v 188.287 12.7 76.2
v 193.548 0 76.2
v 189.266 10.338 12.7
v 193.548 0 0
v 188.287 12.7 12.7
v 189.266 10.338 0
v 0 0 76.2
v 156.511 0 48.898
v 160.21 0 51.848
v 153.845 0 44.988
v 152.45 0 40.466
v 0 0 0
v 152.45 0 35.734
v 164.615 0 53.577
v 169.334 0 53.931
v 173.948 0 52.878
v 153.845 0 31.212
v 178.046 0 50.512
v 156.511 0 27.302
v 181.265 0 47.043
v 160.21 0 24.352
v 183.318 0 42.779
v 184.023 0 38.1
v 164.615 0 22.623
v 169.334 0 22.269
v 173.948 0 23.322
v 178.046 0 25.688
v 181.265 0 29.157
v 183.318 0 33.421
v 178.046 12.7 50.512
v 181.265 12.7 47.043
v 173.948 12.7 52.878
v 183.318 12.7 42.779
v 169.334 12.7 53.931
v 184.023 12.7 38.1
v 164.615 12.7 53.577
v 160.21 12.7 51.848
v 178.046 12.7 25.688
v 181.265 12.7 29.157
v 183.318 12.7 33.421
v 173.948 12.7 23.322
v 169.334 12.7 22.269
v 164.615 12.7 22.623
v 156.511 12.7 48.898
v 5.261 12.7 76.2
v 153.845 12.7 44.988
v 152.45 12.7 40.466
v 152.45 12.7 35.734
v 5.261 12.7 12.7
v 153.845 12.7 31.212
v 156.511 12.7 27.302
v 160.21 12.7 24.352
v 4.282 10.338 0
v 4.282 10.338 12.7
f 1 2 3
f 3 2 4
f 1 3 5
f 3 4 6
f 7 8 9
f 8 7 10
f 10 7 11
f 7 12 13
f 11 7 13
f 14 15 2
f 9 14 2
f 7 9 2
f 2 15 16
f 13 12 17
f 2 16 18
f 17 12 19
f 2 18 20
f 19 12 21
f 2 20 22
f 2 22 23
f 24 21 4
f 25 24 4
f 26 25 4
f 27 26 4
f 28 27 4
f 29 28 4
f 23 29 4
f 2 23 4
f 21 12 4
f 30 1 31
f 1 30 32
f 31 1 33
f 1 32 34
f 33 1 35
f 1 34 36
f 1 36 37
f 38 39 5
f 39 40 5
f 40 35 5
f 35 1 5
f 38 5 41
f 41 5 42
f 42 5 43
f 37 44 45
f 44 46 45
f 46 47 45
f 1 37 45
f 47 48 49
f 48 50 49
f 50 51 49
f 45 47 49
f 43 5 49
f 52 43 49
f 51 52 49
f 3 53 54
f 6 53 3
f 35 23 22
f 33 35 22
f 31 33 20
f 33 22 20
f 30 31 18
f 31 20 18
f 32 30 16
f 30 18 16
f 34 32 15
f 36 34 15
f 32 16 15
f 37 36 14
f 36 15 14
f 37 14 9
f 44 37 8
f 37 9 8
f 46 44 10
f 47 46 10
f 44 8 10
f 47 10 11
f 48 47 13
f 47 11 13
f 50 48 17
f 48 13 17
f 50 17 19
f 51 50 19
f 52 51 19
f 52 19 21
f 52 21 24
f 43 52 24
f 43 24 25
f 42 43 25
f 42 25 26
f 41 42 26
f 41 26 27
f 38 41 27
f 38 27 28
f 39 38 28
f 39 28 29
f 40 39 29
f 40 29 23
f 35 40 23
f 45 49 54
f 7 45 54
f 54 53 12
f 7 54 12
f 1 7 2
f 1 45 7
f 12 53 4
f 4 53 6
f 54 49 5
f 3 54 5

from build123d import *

# Parameters (mm, degrees)
BOSS_EXTRUDE1_DEPTH = 76.2
SKETCH2_W           = 193.548
SKETCH2_H           = 12.7
CUT_EXTRUDE1_DEPTH  = 2.3622
SKETCH3_R           = 15.875
CUT_EXTRUDE2_DEPTH  = 13.7


with BuildPart() as part:
    # Sketch1 → Boss-Extrude1 (new body)
    with BuildSketch(Plane.XY):
        Polygon((0, 0), (193.548, 0), (188.287487758, 12.7), (5.260512242, 12.7), align=None)
    extrude(amount=BOSS_EXTRUDE1_DEPTH)

    # Sketch2 → Cut-Extrude1 (cut)
    with BuildSketch(Plane(origin=(0, 12.7, 0), x_dir=(1, 0, 0), z_dir=(0, 1, 0))):
        with Locations((96.774, -6.35)):
            Rectangle(SKETCH2_W, SKETCH2_H)
    extrude(amount=-CUT_EXTRUDE1_DEPTH, mode=Mode.SUBTRACT)

    # Sketch3 → Cut-Extrude2 (cut, through all)
    with BuildSketch(Plane.XZ):
        with Locations((168.148, 38.1)):
            Circle(SKETCH3_R)
    extrude(amount=-CUT_EXTRUDE2_DEPTH, mode=Mode.SUBTRACT)


solid = part.part
